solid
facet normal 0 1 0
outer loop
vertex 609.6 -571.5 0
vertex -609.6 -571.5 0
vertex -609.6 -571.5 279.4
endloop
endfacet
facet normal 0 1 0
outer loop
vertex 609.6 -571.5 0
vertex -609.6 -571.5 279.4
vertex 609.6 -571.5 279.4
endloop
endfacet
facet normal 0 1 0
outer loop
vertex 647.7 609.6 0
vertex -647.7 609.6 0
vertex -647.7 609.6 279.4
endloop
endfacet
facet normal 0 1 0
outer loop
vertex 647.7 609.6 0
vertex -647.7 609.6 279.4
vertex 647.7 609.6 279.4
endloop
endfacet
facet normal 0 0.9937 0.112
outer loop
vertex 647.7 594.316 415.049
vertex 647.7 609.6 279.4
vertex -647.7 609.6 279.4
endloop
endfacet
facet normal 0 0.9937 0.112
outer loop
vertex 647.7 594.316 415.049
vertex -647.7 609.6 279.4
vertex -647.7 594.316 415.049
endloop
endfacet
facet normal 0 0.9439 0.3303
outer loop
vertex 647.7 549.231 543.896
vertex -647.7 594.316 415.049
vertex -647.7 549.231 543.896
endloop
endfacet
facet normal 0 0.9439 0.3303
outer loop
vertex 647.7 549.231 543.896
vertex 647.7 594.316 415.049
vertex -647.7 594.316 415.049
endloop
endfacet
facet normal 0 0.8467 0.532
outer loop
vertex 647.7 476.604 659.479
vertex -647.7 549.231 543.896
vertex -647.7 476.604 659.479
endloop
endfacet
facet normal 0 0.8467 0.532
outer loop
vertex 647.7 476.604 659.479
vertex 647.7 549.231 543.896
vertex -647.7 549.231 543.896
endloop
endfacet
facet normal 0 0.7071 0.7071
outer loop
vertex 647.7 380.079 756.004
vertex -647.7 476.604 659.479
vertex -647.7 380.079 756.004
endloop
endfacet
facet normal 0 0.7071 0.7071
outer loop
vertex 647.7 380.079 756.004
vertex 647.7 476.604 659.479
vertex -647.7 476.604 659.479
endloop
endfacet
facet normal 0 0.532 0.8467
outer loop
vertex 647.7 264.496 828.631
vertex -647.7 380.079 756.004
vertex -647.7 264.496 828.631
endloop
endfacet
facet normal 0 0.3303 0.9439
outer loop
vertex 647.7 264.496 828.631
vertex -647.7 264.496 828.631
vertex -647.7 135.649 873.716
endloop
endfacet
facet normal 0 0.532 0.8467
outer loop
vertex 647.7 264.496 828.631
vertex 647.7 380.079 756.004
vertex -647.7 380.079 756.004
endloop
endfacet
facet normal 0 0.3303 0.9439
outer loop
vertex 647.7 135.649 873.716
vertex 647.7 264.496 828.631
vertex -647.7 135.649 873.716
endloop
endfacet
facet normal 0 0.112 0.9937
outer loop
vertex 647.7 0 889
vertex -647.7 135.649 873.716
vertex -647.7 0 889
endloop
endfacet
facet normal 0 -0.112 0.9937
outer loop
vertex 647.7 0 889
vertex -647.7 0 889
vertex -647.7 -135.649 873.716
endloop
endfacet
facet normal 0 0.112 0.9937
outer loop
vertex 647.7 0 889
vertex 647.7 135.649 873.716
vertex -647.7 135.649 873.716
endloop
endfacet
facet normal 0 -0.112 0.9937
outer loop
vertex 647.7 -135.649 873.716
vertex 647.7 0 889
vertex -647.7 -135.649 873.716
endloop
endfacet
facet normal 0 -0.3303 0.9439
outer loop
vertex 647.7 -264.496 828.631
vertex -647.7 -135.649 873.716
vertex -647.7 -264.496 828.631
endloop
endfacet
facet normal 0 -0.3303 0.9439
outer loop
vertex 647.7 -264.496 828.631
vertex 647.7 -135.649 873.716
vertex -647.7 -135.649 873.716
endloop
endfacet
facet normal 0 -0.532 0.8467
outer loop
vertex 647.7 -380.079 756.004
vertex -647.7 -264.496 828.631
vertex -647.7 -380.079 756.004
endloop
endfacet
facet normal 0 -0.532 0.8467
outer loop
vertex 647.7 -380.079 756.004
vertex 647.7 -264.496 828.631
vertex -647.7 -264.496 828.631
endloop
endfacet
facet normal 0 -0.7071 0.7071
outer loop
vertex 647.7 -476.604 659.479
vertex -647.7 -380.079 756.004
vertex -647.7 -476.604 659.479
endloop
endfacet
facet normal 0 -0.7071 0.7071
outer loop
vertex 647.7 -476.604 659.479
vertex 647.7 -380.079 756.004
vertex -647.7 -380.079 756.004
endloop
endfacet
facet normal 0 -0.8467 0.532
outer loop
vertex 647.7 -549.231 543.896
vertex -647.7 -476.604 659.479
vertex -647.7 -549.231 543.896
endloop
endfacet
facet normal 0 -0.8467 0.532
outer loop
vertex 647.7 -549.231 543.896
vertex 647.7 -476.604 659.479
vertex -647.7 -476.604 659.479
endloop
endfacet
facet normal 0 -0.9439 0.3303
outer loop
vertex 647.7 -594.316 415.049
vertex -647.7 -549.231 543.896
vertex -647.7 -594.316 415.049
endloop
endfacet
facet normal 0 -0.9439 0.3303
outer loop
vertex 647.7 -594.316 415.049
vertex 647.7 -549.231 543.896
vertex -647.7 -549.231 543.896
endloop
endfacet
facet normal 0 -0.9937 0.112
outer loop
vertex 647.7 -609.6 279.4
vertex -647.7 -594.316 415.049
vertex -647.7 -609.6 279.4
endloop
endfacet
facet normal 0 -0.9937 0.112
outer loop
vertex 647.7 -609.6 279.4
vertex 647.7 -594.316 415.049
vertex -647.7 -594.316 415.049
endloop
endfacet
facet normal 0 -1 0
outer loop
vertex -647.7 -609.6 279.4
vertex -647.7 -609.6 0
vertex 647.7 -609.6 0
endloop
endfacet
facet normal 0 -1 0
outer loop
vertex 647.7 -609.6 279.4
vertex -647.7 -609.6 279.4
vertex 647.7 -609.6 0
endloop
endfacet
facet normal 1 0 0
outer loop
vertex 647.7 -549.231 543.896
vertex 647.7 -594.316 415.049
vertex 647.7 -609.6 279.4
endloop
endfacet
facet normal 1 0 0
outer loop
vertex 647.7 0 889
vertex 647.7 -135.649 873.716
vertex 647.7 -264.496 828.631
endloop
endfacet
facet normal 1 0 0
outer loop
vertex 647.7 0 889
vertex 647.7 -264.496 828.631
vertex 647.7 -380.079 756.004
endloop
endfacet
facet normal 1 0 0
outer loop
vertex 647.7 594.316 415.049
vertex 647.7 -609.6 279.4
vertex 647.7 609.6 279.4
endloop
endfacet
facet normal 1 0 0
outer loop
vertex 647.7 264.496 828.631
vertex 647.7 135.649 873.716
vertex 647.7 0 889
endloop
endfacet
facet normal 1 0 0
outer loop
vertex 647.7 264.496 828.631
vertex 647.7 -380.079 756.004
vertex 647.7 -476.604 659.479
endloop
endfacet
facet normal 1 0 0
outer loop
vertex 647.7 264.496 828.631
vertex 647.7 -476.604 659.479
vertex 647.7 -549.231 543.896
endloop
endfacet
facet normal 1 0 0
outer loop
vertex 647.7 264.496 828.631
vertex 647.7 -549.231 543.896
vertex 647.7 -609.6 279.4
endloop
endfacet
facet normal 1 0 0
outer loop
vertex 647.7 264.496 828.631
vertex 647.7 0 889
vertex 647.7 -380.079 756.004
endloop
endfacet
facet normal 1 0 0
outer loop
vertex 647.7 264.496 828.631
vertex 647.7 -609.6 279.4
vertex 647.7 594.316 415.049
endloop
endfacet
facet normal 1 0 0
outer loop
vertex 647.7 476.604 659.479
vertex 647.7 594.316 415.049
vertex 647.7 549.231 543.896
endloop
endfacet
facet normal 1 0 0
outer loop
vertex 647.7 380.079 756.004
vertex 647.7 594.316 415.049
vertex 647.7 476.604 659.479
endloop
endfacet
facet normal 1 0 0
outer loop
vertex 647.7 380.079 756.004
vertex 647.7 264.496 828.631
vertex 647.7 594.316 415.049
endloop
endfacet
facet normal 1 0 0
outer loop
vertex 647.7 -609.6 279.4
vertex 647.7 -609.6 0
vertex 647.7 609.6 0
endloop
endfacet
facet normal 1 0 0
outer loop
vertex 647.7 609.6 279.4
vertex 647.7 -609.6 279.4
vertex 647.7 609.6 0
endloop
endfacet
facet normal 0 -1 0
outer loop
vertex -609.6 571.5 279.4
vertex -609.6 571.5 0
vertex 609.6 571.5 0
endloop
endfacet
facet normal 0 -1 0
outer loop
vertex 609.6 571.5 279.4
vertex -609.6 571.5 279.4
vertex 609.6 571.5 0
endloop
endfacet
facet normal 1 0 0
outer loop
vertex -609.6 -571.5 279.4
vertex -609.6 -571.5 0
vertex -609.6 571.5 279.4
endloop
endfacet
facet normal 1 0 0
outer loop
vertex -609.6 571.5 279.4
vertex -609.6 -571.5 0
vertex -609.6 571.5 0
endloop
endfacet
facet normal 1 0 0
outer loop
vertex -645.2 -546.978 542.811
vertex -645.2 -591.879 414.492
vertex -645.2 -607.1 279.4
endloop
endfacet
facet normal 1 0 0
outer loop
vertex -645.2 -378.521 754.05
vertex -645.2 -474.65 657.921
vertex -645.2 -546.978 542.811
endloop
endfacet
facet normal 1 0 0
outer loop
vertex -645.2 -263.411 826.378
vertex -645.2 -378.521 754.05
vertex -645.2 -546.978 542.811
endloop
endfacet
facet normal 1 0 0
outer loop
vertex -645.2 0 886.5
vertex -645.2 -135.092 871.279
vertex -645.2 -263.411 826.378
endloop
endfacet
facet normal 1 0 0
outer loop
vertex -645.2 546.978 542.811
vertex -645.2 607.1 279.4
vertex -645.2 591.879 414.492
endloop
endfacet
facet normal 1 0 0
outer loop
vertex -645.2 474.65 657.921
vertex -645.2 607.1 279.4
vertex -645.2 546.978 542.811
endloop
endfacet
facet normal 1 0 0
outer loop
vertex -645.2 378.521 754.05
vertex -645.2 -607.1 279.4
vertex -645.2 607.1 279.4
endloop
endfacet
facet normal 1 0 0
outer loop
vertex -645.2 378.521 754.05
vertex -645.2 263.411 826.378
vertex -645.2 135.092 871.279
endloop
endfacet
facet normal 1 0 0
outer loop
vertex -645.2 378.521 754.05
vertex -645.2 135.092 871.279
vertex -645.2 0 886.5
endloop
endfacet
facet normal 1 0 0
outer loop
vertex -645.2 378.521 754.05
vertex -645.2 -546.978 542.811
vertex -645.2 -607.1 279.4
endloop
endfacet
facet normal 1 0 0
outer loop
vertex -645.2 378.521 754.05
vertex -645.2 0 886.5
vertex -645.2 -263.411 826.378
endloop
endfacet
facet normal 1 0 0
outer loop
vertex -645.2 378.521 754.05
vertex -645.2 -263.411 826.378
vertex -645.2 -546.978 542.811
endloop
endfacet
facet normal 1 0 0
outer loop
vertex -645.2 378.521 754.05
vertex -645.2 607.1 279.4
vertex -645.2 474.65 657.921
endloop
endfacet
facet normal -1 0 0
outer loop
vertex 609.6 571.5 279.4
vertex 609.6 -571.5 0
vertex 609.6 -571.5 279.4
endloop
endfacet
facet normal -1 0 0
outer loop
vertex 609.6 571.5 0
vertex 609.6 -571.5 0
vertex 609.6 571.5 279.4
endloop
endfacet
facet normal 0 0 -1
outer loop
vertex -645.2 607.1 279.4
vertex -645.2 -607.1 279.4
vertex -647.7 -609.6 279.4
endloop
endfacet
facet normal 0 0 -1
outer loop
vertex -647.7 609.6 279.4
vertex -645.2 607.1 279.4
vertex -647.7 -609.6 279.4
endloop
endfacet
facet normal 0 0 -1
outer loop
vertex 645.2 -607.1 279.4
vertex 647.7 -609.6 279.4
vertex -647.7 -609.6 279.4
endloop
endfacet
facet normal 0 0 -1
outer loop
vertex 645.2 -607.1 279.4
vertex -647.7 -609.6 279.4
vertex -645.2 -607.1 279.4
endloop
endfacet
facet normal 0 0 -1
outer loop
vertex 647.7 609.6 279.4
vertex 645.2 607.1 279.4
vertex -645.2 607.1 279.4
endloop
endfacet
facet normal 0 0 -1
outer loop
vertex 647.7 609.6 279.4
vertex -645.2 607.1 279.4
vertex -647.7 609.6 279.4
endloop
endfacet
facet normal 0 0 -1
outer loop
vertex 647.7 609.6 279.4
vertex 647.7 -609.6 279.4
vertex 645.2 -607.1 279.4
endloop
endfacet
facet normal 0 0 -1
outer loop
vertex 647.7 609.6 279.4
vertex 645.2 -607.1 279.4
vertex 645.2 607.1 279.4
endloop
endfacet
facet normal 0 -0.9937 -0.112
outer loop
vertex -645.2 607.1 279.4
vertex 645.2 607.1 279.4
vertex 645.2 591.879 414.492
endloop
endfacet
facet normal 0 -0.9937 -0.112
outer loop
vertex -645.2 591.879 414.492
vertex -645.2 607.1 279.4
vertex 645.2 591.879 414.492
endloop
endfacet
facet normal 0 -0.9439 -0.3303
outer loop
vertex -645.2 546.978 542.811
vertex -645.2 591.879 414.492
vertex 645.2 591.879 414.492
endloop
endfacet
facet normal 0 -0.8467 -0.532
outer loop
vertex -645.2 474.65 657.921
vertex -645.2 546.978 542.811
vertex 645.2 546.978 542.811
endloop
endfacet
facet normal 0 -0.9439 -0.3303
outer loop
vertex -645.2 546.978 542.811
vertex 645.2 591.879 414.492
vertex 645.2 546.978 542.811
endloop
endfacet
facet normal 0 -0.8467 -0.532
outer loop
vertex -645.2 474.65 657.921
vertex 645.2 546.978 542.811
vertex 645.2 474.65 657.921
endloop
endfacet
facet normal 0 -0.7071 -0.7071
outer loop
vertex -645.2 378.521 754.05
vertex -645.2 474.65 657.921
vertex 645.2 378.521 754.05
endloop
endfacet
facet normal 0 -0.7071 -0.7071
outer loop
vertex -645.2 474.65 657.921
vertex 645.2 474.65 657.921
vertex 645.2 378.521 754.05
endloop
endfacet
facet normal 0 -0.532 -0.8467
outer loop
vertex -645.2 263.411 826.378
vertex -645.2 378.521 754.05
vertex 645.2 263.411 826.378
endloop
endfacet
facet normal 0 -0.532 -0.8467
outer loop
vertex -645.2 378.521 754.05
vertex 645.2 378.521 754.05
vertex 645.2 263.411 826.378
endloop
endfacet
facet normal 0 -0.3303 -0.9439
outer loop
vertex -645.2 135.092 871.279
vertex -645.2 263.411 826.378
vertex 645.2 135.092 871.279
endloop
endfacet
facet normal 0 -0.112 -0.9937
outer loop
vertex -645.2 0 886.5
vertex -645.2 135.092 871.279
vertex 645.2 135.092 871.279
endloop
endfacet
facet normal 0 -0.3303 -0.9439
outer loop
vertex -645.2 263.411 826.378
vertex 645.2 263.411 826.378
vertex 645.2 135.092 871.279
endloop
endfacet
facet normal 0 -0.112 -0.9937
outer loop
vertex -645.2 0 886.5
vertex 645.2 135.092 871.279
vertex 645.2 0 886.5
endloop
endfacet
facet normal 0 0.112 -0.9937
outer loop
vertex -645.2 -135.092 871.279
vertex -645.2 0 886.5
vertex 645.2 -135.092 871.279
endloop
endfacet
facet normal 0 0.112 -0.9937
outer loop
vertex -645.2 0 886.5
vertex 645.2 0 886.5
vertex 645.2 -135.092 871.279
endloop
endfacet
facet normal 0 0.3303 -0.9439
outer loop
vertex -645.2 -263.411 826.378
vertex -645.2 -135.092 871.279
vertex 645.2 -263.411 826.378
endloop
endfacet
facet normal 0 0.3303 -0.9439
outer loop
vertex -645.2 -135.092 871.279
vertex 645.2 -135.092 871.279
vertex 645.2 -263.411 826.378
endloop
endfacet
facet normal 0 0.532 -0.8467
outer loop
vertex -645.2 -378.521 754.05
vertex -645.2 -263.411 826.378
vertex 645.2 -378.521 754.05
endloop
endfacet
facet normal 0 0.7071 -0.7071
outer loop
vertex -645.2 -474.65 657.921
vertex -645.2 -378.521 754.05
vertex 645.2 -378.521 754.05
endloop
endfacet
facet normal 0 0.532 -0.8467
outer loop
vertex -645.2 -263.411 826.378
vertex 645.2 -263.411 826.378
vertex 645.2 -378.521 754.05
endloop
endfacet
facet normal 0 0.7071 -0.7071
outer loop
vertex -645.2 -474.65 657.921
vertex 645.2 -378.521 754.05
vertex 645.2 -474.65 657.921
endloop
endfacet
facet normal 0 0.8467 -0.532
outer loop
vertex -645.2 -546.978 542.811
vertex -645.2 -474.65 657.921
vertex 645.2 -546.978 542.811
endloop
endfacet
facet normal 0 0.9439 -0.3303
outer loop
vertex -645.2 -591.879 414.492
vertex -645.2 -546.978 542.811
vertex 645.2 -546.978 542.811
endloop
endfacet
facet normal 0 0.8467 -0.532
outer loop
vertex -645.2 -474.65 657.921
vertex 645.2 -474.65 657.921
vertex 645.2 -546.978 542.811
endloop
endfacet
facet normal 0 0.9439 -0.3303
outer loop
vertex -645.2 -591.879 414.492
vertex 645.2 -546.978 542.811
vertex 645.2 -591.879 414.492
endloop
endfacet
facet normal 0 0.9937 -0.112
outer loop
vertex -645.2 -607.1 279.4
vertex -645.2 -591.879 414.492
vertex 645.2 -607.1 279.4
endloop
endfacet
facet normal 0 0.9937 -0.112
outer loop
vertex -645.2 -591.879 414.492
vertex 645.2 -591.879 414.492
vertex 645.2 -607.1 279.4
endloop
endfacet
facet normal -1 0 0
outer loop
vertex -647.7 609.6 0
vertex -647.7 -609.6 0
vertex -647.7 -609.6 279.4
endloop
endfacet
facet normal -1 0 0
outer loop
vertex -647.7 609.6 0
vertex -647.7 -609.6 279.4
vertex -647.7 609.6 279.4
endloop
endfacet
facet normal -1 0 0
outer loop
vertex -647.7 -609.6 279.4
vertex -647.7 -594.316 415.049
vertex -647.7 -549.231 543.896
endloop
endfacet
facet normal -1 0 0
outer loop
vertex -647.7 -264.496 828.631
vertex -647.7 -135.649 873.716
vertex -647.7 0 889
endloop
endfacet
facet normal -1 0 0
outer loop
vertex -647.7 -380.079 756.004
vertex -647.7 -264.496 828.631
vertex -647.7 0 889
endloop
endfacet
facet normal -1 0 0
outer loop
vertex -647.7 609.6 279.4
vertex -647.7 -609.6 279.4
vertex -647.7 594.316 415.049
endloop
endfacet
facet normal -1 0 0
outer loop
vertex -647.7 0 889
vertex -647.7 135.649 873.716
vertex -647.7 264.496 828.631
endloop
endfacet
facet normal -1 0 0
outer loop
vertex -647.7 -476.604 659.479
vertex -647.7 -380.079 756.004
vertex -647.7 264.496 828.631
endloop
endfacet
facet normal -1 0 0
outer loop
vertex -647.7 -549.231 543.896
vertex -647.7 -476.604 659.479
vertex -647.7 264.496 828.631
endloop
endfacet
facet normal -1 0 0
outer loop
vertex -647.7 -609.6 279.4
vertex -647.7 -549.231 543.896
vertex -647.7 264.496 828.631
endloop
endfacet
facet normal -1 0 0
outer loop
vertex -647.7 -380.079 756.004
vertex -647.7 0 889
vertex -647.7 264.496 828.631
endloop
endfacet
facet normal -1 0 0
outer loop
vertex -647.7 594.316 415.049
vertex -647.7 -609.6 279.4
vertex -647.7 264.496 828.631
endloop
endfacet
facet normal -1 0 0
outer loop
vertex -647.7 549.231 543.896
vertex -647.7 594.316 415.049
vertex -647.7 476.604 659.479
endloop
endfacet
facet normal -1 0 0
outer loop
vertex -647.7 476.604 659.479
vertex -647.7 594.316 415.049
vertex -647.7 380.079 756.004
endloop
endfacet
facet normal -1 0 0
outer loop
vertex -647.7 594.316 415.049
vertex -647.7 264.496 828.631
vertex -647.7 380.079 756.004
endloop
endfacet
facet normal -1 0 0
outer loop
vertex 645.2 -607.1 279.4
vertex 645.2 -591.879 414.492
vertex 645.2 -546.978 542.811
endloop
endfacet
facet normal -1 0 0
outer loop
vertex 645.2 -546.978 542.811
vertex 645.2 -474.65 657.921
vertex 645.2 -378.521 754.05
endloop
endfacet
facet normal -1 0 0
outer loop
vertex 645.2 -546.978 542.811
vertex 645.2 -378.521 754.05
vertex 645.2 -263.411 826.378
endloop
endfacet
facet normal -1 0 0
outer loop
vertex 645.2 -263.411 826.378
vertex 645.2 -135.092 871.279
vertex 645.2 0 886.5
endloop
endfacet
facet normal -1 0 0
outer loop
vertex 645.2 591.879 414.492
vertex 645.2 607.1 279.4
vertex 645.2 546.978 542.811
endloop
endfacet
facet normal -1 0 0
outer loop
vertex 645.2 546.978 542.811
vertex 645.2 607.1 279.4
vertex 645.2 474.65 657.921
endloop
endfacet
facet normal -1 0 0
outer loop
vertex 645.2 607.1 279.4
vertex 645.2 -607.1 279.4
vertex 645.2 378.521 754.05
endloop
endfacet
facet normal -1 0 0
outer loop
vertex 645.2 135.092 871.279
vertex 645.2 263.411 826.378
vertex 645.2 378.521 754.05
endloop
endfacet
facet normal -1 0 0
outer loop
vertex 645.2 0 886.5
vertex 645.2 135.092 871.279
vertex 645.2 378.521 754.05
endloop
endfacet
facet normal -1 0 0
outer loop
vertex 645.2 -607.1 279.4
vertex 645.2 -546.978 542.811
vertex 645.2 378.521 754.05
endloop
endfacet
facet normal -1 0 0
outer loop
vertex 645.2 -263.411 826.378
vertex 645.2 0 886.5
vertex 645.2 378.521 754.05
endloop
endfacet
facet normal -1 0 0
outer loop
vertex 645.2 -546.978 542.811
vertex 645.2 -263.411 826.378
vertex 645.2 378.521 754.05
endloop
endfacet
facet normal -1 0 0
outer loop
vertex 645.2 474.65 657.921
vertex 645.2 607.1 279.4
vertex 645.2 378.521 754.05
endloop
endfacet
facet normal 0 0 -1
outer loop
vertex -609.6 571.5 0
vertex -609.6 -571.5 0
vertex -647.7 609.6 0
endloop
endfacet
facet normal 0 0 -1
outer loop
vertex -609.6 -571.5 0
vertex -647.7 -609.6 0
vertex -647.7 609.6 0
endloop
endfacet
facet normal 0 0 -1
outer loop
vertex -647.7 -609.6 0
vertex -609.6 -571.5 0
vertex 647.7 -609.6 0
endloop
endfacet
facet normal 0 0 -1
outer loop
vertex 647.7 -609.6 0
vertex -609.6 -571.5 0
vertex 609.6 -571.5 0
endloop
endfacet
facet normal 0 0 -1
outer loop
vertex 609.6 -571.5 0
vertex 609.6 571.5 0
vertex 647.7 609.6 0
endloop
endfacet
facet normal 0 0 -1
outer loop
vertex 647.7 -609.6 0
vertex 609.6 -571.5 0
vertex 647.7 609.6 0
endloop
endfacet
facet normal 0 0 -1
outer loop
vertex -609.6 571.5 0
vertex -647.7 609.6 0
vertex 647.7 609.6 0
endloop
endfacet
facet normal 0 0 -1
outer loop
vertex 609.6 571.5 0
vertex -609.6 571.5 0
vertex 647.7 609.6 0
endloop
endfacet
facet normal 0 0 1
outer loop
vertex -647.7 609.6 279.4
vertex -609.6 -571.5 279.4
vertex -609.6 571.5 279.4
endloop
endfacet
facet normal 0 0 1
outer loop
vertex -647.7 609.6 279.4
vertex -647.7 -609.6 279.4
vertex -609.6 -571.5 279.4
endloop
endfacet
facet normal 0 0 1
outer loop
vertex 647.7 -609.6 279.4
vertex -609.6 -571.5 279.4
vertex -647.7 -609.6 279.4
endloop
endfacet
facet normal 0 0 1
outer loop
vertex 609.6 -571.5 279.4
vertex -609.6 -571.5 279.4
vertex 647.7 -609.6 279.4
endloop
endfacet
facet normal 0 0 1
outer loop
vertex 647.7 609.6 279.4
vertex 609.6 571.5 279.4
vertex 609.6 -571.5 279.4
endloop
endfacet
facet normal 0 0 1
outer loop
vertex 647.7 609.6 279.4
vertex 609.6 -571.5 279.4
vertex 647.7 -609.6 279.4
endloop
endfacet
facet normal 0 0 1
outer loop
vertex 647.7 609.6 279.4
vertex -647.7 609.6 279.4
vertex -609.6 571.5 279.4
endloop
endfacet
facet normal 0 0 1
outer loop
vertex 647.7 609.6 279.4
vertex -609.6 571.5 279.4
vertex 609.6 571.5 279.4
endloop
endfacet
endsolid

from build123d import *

# Parameters (mm, degrees)
F0_W     = 1295.4
F0_H     = 1219.2
F0_W_2   = 1219.2
F0_H_2   = 1143
F1_DEPTH = 279.4
F3_DEPTH = 1295.4
F4_T     = -2.5


with BuildPart() as f1:
    # F0 (on Top) → F1 (new body)
    with BuildSketch(Plane.XY):
        Rectangle(F0_W, F0_H)
        Rectangle(F0_W_2, F0_H_2, mode=Mode.SUBTRACT)
    extrude(amount=F1_DEPTH)


with BuildPart() as f3:
    # F2 (on face) → F3 (new body, through all)
    with BuildSketch(Plane.YZ.offset(647.7)):
        with BuildLine():
            Line((-609.6, 279.4), (609.6, 279.4))
            ThreePointArc((609.6, 279.4), (0, 889), (-609.6, 279.4))
        make_face()
    extrude(amount=-F3_DEPTH)

    # F4
    f4_openings = [f3.faces().sort_by_distance(p)[0] for p in [
        (0, 0, 279.4),
    ]]
    offset(amount=F4_T, openings=f4_openings)


solid = Compound([f1.part, f3.part])
